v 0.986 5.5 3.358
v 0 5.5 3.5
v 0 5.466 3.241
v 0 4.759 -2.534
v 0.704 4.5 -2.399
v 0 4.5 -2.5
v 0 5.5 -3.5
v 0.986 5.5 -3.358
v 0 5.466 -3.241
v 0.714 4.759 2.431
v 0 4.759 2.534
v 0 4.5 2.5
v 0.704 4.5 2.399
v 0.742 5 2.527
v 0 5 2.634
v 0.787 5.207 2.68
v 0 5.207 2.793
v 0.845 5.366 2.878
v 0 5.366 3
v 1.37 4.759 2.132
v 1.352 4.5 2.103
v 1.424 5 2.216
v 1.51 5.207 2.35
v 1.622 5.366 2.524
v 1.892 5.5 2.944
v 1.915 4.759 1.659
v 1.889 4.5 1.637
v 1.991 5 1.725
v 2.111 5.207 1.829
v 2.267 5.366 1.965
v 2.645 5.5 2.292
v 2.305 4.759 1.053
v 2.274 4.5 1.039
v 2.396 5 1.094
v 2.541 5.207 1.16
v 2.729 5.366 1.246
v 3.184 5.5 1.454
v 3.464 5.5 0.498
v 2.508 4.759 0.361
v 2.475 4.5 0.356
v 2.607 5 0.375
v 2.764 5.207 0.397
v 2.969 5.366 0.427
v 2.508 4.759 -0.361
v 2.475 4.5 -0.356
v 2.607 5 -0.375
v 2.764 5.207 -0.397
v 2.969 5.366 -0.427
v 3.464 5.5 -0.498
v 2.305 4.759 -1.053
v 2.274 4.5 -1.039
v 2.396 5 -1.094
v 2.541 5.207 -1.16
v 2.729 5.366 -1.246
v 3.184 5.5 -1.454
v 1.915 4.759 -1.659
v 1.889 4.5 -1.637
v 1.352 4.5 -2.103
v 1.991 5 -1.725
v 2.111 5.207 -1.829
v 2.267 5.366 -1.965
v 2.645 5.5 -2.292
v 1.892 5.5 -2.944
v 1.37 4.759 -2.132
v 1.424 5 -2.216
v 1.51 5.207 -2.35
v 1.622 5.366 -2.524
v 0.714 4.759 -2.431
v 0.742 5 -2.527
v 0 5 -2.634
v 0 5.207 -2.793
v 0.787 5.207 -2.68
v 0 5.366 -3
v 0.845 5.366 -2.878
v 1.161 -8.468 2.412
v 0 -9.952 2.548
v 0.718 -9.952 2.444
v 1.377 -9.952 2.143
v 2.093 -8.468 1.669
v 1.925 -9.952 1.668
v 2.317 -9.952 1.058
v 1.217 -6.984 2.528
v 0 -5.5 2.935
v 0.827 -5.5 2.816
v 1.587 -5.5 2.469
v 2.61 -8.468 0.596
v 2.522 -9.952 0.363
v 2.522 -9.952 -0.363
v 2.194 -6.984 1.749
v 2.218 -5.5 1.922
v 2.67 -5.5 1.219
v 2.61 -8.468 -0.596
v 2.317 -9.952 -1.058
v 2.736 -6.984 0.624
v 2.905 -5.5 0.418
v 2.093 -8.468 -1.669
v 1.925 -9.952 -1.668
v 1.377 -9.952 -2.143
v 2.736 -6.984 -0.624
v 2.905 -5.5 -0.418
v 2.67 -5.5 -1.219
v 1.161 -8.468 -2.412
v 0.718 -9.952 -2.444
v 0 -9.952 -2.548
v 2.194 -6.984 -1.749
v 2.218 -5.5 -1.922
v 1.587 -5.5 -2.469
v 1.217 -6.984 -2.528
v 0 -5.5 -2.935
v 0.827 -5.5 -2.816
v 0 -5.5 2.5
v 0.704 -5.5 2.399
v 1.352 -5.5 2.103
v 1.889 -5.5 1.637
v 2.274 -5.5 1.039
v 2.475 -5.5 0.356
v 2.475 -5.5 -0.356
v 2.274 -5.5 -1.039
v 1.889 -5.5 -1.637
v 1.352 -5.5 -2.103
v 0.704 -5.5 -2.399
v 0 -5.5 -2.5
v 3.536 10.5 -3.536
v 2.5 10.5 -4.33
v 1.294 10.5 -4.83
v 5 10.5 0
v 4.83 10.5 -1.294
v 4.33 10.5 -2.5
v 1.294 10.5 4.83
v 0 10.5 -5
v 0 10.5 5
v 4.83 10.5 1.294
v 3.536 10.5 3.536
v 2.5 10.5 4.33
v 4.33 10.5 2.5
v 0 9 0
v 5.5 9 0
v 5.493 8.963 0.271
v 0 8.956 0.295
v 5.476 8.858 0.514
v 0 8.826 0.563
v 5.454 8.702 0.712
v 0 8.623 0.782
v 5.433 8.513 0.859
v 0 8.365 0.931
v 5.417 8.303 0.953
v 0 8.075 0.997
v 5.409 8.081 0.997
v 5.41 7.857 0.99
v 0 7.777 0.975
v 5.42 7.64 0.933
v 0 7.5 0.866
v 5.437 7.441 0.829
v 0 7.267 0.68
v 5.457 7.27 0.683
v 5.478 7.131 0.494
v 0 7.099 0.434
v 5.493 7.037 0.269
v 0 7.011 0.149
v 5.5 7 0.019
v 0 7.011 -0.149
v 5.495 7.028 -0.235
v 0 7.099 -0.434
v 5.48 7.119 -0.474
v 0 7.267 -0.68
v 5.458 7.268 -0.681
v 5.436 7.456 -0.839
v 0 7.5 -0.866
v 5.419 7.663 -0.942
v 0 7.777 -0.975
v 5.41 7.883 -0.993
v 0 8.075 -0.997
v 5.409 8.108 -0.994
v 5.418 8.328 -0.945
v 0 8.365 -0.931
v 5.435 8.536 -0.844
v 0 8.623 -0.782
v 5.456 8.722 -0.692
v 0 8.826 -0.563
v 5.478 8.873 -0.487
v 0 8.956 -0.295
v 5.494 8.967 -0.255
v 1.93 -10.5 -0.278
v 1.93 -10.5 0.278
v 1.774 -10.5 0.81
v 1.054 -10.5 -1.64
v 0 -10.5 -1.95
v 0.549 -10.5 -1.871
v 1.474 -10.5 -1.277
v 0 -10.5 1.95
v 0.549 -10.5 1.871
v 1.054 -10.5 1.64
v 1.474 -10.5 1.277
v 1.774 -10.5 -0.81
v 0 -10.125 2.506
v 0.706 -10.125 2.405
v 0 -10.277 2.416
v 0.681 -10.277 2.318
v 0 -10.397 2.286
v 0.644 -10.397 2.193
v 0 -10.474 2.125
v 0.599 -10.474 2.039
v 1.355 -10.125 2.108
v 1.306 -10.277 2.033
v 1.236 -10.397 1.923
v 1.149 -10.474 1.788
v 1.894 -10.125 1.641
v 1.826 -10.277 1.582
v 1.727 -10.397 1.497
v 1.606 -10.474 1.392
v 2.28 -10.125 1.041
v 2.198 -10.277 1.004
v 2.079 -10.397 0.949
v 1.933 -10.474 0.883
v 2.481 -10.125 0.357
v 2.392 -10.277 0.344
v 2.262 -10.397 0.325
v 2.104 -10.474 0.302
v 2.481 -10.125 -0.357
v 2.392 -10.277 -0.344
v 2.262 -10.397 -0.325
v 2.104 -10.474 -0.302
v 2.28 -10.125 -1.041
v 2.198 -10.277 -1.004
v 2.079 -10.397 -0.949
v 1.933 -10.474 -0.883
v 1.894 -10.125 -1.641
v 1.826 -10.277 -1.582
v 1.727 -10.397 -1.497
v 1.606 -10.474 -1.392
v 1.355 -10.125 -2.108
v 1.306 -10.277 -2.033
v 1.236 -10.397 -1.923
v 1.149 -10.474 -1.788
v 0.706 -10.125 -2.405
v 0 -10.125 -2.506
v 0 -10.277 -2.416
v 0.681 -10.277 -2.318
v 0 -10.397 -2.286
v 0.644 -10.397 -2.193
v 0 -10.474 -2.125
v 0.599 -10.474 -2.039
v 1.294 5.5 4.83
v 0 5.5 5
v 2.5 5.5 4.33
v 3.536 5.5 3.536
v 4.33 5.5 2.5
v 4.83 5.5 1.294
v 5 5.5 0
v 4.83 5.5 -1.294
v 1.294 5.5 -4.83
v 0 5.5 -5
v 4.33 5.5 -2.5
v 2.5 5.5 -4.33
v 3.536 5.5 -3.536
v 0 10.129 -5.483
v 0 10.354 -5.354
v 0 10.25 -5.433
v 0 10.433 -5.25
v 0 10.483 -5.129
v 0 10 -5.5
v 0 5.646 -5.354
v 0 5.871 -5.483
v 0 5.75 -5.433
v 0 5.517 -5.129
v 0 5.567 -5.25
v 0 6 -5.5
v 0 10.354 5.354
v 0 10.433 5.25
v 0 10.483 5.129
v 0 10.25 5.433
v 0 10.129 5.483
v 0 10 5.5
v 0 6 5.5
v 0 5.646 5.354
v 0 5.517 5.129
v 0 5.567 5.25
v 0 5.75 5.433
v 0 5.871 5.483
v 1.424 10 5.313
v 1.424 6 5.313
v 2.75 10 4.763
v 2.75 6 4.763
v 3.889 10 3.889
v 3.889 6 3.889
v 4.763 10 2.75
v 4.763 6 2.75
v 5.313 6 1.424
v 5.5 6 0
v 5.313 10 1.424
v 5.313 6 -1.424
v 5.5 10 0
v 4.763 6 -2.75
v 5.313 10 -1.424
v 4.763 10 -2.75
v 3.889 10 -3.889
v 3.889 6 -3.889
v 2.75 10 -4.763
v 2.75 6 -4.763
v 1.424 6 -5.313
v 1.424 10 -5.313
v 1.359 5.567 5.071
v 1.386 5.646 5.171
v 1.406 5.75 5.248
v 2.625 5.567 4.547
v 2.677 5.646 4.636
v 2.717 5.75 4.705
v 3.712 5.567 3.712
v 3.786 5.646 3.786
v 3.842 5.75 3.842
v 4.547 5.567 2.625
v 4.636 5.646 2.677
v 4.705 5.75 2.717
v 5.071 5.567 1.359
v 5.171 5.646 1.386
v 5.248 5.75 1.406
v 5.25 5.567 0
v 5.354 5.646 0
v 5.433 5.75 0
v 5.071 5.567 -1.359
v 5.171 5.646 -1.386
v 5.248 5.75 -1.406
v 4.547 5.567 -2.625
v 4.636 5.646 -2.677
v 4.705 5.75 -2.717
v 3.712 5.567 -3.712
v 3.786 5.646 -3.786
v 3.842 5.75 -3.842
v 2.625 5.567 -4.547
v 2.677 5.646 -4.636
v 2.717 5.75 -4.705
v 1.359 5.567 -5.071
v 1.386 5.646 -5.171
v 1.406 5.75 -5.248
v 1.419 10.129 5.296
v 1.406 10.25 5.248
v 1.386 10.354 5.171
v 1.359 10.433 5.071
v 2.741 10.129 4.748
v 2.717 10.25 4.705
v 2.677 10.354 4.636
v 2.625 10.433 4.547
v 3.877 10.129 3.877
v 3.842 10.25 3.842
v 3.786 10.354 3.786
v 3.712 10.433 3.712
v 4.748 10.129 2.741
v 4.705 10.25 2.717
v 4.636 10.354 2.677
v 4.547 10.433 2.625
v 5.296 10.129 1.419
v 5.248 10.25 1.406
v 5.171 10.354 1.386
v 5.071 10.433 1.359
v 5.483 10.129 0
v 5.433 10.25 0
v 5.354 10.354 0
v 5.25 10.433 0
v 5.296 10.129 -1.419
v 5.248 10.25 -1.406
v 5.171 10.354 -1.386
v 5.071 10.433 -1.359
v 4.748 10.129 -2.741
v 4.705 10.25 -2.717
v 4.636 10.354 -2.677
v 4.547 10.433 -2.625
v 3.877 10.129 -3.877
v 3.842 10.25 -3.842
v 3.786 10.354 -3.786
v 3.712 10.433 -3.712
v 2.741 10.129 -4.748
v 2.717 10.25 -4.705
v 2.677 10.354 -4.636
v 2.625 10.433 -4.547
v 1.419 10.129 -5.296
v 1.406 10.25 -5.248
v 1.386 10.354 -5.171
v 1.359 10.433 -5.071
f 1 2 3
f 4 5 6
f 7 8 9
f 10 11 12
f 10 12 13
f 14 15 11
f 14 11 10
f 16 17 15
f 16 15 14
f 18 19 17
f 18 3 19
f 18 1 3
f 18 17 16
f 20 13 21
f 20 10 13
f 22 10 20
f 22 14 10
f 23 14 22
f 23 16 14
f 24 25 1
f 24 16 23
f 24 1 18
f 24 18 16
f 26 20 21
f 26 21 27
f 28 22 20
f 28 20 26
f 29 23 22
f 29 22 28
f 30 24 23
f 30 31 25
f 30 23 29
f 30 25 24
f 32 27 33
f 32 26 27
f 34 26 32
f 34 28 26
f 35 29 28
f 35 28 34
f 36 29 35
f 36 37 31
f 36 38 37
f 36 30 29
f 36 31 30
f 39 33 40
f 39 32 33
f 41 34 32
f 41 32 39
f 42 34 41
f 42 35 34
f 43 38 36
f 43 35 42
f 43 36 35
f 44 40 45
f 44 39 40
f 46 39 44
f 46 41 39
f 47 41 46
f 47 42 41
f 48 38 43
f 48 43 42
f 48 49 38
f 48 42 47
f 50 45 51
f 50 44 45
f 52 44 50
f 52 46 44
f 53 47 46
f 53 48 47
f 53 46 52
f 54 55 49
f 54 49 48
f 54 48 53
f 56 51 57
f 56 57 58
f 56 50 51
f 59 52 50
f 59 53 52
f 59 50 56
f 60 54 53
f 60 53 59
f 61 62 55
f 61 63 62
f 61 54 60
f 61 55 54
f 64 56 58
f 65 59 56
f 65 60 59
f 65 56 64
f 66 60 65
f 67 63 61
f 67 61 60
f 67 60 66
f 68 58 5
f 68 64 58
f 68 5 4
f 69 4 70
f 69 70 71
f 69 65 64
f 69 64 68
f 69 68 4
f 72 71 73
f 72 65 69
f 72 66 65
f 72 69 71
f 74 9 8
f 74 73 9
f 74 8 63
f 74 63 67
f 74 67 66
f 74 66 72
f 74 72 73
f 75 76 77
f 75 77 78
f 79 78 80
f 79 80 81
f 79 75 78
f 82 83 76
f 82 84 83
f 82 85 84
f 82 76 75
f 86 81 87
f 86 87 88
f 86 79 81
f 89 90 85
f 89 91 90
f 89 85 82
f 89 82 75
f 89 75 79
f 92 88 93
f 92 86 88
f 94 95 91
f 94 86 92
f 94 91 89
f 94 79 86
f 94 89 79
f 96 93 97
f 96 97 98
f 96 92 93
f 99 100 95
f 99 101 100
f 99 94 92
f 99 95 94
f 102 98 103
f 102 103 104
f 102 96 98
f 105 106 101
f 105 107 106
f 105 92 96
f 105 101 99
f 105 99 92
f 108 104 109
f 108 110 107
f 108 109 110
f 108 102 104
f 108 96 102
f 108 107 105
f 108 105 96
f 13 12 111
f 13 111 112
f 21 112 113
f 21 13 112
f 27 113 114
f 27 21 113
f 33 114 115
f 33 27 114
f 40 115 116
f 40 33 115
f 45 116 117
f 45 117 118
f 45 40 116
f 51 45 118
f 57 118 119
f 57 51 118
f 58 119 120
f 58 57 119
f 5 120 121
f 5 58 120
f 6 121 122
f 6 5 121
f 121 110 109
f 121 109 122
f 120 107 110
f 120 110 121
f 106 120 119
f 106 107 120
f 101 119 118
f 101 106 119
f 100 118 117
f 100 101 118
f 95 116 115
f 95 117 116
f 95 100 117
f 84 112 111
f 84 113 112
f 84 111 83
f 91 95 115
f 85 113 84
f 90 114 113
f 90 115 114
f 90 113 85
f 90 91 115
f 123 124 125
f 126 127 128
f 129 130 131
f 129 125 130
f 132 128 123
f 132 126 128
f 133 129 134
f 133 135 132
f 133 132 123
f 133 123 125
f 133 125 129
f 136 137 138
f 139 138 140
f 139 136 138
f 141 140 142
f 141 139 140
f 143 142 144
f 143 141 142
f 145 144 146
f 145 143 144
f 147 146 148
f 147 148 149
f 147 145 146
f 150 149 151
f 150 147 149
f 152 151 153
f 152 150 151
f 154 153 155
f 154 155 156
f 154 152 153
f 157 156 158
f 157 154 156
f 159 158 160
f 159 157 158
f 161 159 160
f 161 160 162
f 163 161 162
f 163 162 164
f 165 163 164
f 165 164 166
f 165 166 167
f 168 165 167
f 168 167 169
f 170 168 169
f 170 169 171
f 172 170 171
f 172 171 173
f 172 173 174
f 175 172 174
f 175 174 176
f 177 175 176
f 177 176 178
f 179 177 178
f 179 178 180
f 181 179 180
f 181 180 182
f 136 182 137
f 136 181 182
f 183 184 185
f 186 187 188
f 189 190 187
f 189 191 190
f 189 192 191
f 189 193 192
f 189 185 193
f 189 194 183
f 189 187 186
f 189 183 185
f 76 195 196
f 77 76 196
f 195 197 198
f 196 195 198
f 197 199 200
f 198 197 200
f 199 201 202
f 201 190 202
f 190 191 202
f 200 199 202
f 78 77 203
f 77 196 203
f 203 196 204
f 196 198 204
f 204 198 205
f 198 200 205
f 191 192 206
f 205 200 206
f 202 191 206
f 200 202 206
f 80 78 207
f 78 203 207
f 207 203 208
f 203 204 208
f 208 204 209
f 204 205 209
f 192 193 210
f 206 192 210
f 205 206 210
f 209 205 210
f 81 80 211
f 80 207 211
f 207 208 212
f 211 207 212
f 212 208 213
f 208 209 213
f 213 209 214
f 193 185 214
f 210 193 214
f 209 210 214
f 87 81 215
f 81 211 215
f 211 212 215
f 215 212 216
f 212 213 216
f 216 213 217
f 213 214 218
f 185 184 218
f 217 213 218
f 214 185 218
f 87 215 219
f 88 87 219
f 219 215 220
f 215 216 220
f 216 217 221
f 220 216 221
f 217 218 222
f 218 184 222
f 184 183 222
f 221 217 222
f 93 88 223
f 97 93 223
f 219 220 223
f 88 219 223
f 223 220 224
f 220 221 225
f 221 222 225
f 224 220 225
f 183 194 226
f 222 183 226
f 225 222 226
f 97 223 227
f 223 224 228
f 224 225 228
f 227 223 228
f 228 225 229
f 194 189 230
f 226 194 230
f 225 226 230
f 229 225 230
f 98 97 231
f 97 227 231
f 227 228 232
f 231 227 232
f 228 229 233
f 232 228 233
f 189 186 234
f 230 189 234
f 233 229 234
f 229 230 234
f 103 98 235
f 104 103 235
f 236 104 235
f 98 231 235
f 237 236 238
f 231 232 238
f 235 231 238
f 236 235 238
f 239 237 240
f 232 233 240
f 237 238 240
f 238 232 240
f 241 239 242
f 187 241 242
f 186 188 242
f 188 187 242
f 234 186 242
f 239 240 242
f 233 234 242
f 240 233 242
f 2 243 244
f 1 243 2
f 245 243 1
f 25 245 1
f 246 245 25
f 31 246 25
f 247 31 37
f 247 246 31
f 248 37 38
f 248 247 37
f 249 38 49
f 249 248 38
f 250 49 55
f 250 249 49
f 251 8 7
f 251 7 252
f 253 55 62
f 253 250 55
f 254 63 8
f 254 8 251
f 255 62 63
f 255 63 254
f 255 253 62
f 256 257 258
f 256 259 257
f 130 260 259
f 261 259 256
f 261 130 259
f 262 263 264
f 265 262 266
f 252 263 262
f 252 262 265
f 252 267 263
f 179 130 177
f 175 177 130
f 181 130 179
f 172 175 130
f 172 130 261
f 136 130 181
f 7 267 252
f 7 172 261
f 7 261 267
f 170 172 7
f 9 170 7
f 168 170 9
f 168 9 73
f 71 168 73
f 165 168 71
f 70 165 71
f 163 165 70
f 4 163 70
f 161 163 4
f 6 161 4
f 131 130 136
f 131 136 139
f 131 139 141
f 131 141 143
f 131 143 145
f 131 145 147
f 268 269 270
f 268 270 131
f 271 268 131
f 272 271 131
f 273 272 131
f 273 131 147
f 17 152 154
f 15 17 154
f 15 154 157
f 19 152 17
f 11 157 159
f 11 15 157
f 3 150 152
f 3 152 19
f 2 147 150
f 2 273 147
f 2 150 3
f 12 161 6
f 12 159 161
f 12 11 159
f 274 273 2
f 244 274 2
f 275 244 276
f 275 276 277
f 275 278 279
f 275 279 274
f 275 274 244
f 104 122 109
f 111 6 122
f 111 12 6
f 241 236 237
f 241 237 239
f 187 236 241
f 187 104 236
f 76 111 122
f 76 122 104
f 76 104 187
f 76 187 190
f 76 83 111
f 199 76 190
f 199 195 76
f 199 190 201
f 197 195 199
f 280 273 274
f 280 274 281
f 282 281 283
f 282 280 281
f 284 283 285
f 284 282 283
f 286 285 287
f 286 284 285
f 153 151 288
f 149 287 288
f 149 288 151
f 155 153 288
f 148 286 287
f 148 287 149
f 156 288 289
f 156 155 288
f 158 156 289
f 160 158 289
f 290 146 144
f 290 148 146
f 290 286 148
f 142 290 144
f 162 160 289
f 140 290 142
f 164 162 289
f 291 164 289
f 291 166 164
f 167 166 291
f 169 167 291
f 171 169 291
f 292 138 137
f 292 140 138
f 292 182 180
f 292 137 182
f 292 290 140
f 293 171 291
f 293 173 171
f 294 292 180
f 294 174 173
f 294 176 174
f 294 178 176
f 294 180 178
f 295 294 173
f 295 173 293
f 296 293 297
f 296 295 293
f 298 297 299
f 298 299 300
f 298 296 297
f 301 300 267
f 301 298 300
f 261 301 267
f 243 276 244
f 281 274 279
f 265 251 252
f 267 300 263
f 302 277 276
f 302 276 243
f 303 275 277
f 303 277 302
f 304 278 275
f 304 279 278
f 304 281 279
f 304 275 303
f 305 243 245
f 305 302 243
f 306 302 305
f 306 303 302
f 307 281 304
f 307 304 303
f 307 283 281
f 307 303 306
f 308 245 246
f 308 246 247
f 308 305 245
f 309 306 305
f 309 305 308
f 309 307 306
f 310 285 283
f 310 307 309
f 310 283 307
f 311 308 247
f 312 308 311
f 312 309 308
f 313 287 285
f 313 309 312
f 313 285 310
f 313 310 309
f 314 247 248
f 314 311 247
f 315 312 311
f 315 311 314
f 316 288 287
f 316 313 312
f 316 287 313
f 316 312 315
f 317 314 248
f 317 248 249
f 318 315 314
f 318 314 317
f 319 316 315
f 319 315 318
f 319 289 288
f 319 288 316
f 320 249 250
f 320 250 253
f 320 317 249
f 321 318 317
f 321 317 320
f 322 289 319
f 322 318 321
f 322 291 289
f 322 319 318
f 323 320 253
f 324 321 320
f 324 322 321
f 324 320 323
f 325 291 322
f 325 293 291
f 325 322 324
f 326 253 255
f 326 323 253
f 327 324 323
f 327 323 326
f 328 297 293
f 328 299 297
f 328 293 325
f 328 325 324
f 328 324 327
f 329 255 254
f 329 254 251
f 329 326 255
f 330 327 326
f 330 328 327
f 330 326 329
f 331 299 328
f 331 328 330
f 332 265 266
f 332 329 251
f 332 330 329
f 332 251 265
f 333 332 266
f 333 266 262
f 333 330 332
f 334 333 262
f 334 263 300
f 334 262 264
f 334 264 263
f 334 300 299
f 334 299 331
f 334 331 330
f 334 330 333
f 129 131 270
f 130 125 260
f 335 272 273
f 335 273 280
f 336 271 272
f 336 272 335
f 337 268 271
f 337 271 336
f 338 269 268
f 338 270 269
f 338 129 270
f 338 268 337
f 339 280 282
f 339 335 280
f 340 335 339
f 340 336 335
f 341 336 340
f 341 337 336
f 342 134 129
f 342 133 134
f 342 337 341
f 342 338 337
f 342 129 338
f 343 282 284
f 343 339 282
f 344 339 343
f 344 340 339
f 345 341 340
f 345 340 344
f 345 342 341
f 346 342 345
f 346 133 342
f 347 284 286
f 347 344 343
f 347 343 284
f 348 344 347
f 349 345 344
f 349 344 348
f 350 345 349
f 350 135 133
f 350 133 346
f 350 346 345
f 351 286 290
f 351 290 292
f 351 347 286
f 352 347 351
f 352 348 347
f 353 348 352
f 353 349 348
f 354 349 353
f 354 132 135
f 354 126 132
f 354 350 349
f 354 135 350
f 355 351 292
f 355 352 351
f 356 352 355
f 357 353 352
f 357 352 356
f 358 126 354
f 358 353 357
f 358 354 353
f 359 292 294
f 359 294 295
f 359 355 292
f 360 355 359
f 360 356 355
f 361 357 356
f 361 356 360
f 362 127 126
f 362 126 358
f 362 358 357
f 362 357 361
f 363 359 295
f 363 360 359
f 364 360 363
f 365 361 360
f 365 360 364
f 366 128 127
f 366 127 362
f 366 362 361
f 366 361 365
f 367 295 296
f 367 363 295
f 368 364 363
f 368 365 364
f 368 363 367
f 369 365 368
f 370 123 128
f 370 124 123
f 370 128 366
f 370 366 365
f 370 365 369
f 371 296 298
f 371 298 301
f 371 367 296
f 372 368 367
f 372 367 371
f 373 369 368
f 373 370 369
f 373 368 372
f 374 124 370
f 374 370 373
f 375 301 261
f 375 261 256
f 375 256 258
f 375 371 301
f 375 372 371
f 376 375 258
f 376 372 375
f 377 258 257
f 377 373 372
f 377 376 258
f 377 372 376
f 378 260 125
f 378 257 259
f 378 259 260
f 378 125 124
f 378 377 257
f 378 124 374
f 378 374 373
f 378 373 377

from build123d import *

# Parameters (mm, degrees)
REVOLUTION001_ANGLE = 180
FILLET003_R         = 0.6
FILLET004_R         = 1
FILLET005_R         = 0.5
SKETCH001_R         = 1
POCKET_DEPTH        = 0.001
POCKET_DEPTH_BACK   = 5.501


with BuildPart() as part:
    # Sketch002 → Revolution001 (revolve)
    with BuildSketch(Plane.YZ):
        Polygon((-10.5, 2.5), (-5.5, 2.935), (-5.5, 2.5), (5.5, 2.5), (5.5, 5.5), (10.5, 5.5), (10.5, 0), (-10.5, 0), align=None)
    revolve(axis=Axis((0, 0, 0), (0, 1, 0)), revolution_arc=REVOLUTION001_ANGLE)

    # Fillet003
    fillet003_edges = [part.edges().sort_by_distance(p)[0] for p in [
        (2.5, -10.5, 0),
    ]]
    fillet(fillet003_edges, radius=FILLET003_R)

    # Fillet004
    fillet004_edges = [part.edges().sort_by_distance(p)[0] for p in [
        (2.5, 5.5, 0),
    ]]
    fillet(fillet004_edges, radius=FILLET004_R)

    # Fillet005
    fillet005_edges = [part.edges().sort_by_distance(p)[0] for p in [
        (5.5, 5.5, 0),
        (5.5, 10.5, 0),
    ]]
    fillet(fillet005_edges, radius=FILLET005_R)

    # Sketch001 → Pocket (cut, two sides)
    with BuildSketch(Plane.YZ) as pocket_sk:
        with Locations((8, 0)):
            Circle(SKETCH001_R)
    extrude(amount=-POCKET_DEPTH, mode=Mode.SUBTRACT)
    extrude(pocket_sk.sketch, amount=POCKET_DEPTH_BACK, mode=Mode.SUBTRACT)


solid = part.part
